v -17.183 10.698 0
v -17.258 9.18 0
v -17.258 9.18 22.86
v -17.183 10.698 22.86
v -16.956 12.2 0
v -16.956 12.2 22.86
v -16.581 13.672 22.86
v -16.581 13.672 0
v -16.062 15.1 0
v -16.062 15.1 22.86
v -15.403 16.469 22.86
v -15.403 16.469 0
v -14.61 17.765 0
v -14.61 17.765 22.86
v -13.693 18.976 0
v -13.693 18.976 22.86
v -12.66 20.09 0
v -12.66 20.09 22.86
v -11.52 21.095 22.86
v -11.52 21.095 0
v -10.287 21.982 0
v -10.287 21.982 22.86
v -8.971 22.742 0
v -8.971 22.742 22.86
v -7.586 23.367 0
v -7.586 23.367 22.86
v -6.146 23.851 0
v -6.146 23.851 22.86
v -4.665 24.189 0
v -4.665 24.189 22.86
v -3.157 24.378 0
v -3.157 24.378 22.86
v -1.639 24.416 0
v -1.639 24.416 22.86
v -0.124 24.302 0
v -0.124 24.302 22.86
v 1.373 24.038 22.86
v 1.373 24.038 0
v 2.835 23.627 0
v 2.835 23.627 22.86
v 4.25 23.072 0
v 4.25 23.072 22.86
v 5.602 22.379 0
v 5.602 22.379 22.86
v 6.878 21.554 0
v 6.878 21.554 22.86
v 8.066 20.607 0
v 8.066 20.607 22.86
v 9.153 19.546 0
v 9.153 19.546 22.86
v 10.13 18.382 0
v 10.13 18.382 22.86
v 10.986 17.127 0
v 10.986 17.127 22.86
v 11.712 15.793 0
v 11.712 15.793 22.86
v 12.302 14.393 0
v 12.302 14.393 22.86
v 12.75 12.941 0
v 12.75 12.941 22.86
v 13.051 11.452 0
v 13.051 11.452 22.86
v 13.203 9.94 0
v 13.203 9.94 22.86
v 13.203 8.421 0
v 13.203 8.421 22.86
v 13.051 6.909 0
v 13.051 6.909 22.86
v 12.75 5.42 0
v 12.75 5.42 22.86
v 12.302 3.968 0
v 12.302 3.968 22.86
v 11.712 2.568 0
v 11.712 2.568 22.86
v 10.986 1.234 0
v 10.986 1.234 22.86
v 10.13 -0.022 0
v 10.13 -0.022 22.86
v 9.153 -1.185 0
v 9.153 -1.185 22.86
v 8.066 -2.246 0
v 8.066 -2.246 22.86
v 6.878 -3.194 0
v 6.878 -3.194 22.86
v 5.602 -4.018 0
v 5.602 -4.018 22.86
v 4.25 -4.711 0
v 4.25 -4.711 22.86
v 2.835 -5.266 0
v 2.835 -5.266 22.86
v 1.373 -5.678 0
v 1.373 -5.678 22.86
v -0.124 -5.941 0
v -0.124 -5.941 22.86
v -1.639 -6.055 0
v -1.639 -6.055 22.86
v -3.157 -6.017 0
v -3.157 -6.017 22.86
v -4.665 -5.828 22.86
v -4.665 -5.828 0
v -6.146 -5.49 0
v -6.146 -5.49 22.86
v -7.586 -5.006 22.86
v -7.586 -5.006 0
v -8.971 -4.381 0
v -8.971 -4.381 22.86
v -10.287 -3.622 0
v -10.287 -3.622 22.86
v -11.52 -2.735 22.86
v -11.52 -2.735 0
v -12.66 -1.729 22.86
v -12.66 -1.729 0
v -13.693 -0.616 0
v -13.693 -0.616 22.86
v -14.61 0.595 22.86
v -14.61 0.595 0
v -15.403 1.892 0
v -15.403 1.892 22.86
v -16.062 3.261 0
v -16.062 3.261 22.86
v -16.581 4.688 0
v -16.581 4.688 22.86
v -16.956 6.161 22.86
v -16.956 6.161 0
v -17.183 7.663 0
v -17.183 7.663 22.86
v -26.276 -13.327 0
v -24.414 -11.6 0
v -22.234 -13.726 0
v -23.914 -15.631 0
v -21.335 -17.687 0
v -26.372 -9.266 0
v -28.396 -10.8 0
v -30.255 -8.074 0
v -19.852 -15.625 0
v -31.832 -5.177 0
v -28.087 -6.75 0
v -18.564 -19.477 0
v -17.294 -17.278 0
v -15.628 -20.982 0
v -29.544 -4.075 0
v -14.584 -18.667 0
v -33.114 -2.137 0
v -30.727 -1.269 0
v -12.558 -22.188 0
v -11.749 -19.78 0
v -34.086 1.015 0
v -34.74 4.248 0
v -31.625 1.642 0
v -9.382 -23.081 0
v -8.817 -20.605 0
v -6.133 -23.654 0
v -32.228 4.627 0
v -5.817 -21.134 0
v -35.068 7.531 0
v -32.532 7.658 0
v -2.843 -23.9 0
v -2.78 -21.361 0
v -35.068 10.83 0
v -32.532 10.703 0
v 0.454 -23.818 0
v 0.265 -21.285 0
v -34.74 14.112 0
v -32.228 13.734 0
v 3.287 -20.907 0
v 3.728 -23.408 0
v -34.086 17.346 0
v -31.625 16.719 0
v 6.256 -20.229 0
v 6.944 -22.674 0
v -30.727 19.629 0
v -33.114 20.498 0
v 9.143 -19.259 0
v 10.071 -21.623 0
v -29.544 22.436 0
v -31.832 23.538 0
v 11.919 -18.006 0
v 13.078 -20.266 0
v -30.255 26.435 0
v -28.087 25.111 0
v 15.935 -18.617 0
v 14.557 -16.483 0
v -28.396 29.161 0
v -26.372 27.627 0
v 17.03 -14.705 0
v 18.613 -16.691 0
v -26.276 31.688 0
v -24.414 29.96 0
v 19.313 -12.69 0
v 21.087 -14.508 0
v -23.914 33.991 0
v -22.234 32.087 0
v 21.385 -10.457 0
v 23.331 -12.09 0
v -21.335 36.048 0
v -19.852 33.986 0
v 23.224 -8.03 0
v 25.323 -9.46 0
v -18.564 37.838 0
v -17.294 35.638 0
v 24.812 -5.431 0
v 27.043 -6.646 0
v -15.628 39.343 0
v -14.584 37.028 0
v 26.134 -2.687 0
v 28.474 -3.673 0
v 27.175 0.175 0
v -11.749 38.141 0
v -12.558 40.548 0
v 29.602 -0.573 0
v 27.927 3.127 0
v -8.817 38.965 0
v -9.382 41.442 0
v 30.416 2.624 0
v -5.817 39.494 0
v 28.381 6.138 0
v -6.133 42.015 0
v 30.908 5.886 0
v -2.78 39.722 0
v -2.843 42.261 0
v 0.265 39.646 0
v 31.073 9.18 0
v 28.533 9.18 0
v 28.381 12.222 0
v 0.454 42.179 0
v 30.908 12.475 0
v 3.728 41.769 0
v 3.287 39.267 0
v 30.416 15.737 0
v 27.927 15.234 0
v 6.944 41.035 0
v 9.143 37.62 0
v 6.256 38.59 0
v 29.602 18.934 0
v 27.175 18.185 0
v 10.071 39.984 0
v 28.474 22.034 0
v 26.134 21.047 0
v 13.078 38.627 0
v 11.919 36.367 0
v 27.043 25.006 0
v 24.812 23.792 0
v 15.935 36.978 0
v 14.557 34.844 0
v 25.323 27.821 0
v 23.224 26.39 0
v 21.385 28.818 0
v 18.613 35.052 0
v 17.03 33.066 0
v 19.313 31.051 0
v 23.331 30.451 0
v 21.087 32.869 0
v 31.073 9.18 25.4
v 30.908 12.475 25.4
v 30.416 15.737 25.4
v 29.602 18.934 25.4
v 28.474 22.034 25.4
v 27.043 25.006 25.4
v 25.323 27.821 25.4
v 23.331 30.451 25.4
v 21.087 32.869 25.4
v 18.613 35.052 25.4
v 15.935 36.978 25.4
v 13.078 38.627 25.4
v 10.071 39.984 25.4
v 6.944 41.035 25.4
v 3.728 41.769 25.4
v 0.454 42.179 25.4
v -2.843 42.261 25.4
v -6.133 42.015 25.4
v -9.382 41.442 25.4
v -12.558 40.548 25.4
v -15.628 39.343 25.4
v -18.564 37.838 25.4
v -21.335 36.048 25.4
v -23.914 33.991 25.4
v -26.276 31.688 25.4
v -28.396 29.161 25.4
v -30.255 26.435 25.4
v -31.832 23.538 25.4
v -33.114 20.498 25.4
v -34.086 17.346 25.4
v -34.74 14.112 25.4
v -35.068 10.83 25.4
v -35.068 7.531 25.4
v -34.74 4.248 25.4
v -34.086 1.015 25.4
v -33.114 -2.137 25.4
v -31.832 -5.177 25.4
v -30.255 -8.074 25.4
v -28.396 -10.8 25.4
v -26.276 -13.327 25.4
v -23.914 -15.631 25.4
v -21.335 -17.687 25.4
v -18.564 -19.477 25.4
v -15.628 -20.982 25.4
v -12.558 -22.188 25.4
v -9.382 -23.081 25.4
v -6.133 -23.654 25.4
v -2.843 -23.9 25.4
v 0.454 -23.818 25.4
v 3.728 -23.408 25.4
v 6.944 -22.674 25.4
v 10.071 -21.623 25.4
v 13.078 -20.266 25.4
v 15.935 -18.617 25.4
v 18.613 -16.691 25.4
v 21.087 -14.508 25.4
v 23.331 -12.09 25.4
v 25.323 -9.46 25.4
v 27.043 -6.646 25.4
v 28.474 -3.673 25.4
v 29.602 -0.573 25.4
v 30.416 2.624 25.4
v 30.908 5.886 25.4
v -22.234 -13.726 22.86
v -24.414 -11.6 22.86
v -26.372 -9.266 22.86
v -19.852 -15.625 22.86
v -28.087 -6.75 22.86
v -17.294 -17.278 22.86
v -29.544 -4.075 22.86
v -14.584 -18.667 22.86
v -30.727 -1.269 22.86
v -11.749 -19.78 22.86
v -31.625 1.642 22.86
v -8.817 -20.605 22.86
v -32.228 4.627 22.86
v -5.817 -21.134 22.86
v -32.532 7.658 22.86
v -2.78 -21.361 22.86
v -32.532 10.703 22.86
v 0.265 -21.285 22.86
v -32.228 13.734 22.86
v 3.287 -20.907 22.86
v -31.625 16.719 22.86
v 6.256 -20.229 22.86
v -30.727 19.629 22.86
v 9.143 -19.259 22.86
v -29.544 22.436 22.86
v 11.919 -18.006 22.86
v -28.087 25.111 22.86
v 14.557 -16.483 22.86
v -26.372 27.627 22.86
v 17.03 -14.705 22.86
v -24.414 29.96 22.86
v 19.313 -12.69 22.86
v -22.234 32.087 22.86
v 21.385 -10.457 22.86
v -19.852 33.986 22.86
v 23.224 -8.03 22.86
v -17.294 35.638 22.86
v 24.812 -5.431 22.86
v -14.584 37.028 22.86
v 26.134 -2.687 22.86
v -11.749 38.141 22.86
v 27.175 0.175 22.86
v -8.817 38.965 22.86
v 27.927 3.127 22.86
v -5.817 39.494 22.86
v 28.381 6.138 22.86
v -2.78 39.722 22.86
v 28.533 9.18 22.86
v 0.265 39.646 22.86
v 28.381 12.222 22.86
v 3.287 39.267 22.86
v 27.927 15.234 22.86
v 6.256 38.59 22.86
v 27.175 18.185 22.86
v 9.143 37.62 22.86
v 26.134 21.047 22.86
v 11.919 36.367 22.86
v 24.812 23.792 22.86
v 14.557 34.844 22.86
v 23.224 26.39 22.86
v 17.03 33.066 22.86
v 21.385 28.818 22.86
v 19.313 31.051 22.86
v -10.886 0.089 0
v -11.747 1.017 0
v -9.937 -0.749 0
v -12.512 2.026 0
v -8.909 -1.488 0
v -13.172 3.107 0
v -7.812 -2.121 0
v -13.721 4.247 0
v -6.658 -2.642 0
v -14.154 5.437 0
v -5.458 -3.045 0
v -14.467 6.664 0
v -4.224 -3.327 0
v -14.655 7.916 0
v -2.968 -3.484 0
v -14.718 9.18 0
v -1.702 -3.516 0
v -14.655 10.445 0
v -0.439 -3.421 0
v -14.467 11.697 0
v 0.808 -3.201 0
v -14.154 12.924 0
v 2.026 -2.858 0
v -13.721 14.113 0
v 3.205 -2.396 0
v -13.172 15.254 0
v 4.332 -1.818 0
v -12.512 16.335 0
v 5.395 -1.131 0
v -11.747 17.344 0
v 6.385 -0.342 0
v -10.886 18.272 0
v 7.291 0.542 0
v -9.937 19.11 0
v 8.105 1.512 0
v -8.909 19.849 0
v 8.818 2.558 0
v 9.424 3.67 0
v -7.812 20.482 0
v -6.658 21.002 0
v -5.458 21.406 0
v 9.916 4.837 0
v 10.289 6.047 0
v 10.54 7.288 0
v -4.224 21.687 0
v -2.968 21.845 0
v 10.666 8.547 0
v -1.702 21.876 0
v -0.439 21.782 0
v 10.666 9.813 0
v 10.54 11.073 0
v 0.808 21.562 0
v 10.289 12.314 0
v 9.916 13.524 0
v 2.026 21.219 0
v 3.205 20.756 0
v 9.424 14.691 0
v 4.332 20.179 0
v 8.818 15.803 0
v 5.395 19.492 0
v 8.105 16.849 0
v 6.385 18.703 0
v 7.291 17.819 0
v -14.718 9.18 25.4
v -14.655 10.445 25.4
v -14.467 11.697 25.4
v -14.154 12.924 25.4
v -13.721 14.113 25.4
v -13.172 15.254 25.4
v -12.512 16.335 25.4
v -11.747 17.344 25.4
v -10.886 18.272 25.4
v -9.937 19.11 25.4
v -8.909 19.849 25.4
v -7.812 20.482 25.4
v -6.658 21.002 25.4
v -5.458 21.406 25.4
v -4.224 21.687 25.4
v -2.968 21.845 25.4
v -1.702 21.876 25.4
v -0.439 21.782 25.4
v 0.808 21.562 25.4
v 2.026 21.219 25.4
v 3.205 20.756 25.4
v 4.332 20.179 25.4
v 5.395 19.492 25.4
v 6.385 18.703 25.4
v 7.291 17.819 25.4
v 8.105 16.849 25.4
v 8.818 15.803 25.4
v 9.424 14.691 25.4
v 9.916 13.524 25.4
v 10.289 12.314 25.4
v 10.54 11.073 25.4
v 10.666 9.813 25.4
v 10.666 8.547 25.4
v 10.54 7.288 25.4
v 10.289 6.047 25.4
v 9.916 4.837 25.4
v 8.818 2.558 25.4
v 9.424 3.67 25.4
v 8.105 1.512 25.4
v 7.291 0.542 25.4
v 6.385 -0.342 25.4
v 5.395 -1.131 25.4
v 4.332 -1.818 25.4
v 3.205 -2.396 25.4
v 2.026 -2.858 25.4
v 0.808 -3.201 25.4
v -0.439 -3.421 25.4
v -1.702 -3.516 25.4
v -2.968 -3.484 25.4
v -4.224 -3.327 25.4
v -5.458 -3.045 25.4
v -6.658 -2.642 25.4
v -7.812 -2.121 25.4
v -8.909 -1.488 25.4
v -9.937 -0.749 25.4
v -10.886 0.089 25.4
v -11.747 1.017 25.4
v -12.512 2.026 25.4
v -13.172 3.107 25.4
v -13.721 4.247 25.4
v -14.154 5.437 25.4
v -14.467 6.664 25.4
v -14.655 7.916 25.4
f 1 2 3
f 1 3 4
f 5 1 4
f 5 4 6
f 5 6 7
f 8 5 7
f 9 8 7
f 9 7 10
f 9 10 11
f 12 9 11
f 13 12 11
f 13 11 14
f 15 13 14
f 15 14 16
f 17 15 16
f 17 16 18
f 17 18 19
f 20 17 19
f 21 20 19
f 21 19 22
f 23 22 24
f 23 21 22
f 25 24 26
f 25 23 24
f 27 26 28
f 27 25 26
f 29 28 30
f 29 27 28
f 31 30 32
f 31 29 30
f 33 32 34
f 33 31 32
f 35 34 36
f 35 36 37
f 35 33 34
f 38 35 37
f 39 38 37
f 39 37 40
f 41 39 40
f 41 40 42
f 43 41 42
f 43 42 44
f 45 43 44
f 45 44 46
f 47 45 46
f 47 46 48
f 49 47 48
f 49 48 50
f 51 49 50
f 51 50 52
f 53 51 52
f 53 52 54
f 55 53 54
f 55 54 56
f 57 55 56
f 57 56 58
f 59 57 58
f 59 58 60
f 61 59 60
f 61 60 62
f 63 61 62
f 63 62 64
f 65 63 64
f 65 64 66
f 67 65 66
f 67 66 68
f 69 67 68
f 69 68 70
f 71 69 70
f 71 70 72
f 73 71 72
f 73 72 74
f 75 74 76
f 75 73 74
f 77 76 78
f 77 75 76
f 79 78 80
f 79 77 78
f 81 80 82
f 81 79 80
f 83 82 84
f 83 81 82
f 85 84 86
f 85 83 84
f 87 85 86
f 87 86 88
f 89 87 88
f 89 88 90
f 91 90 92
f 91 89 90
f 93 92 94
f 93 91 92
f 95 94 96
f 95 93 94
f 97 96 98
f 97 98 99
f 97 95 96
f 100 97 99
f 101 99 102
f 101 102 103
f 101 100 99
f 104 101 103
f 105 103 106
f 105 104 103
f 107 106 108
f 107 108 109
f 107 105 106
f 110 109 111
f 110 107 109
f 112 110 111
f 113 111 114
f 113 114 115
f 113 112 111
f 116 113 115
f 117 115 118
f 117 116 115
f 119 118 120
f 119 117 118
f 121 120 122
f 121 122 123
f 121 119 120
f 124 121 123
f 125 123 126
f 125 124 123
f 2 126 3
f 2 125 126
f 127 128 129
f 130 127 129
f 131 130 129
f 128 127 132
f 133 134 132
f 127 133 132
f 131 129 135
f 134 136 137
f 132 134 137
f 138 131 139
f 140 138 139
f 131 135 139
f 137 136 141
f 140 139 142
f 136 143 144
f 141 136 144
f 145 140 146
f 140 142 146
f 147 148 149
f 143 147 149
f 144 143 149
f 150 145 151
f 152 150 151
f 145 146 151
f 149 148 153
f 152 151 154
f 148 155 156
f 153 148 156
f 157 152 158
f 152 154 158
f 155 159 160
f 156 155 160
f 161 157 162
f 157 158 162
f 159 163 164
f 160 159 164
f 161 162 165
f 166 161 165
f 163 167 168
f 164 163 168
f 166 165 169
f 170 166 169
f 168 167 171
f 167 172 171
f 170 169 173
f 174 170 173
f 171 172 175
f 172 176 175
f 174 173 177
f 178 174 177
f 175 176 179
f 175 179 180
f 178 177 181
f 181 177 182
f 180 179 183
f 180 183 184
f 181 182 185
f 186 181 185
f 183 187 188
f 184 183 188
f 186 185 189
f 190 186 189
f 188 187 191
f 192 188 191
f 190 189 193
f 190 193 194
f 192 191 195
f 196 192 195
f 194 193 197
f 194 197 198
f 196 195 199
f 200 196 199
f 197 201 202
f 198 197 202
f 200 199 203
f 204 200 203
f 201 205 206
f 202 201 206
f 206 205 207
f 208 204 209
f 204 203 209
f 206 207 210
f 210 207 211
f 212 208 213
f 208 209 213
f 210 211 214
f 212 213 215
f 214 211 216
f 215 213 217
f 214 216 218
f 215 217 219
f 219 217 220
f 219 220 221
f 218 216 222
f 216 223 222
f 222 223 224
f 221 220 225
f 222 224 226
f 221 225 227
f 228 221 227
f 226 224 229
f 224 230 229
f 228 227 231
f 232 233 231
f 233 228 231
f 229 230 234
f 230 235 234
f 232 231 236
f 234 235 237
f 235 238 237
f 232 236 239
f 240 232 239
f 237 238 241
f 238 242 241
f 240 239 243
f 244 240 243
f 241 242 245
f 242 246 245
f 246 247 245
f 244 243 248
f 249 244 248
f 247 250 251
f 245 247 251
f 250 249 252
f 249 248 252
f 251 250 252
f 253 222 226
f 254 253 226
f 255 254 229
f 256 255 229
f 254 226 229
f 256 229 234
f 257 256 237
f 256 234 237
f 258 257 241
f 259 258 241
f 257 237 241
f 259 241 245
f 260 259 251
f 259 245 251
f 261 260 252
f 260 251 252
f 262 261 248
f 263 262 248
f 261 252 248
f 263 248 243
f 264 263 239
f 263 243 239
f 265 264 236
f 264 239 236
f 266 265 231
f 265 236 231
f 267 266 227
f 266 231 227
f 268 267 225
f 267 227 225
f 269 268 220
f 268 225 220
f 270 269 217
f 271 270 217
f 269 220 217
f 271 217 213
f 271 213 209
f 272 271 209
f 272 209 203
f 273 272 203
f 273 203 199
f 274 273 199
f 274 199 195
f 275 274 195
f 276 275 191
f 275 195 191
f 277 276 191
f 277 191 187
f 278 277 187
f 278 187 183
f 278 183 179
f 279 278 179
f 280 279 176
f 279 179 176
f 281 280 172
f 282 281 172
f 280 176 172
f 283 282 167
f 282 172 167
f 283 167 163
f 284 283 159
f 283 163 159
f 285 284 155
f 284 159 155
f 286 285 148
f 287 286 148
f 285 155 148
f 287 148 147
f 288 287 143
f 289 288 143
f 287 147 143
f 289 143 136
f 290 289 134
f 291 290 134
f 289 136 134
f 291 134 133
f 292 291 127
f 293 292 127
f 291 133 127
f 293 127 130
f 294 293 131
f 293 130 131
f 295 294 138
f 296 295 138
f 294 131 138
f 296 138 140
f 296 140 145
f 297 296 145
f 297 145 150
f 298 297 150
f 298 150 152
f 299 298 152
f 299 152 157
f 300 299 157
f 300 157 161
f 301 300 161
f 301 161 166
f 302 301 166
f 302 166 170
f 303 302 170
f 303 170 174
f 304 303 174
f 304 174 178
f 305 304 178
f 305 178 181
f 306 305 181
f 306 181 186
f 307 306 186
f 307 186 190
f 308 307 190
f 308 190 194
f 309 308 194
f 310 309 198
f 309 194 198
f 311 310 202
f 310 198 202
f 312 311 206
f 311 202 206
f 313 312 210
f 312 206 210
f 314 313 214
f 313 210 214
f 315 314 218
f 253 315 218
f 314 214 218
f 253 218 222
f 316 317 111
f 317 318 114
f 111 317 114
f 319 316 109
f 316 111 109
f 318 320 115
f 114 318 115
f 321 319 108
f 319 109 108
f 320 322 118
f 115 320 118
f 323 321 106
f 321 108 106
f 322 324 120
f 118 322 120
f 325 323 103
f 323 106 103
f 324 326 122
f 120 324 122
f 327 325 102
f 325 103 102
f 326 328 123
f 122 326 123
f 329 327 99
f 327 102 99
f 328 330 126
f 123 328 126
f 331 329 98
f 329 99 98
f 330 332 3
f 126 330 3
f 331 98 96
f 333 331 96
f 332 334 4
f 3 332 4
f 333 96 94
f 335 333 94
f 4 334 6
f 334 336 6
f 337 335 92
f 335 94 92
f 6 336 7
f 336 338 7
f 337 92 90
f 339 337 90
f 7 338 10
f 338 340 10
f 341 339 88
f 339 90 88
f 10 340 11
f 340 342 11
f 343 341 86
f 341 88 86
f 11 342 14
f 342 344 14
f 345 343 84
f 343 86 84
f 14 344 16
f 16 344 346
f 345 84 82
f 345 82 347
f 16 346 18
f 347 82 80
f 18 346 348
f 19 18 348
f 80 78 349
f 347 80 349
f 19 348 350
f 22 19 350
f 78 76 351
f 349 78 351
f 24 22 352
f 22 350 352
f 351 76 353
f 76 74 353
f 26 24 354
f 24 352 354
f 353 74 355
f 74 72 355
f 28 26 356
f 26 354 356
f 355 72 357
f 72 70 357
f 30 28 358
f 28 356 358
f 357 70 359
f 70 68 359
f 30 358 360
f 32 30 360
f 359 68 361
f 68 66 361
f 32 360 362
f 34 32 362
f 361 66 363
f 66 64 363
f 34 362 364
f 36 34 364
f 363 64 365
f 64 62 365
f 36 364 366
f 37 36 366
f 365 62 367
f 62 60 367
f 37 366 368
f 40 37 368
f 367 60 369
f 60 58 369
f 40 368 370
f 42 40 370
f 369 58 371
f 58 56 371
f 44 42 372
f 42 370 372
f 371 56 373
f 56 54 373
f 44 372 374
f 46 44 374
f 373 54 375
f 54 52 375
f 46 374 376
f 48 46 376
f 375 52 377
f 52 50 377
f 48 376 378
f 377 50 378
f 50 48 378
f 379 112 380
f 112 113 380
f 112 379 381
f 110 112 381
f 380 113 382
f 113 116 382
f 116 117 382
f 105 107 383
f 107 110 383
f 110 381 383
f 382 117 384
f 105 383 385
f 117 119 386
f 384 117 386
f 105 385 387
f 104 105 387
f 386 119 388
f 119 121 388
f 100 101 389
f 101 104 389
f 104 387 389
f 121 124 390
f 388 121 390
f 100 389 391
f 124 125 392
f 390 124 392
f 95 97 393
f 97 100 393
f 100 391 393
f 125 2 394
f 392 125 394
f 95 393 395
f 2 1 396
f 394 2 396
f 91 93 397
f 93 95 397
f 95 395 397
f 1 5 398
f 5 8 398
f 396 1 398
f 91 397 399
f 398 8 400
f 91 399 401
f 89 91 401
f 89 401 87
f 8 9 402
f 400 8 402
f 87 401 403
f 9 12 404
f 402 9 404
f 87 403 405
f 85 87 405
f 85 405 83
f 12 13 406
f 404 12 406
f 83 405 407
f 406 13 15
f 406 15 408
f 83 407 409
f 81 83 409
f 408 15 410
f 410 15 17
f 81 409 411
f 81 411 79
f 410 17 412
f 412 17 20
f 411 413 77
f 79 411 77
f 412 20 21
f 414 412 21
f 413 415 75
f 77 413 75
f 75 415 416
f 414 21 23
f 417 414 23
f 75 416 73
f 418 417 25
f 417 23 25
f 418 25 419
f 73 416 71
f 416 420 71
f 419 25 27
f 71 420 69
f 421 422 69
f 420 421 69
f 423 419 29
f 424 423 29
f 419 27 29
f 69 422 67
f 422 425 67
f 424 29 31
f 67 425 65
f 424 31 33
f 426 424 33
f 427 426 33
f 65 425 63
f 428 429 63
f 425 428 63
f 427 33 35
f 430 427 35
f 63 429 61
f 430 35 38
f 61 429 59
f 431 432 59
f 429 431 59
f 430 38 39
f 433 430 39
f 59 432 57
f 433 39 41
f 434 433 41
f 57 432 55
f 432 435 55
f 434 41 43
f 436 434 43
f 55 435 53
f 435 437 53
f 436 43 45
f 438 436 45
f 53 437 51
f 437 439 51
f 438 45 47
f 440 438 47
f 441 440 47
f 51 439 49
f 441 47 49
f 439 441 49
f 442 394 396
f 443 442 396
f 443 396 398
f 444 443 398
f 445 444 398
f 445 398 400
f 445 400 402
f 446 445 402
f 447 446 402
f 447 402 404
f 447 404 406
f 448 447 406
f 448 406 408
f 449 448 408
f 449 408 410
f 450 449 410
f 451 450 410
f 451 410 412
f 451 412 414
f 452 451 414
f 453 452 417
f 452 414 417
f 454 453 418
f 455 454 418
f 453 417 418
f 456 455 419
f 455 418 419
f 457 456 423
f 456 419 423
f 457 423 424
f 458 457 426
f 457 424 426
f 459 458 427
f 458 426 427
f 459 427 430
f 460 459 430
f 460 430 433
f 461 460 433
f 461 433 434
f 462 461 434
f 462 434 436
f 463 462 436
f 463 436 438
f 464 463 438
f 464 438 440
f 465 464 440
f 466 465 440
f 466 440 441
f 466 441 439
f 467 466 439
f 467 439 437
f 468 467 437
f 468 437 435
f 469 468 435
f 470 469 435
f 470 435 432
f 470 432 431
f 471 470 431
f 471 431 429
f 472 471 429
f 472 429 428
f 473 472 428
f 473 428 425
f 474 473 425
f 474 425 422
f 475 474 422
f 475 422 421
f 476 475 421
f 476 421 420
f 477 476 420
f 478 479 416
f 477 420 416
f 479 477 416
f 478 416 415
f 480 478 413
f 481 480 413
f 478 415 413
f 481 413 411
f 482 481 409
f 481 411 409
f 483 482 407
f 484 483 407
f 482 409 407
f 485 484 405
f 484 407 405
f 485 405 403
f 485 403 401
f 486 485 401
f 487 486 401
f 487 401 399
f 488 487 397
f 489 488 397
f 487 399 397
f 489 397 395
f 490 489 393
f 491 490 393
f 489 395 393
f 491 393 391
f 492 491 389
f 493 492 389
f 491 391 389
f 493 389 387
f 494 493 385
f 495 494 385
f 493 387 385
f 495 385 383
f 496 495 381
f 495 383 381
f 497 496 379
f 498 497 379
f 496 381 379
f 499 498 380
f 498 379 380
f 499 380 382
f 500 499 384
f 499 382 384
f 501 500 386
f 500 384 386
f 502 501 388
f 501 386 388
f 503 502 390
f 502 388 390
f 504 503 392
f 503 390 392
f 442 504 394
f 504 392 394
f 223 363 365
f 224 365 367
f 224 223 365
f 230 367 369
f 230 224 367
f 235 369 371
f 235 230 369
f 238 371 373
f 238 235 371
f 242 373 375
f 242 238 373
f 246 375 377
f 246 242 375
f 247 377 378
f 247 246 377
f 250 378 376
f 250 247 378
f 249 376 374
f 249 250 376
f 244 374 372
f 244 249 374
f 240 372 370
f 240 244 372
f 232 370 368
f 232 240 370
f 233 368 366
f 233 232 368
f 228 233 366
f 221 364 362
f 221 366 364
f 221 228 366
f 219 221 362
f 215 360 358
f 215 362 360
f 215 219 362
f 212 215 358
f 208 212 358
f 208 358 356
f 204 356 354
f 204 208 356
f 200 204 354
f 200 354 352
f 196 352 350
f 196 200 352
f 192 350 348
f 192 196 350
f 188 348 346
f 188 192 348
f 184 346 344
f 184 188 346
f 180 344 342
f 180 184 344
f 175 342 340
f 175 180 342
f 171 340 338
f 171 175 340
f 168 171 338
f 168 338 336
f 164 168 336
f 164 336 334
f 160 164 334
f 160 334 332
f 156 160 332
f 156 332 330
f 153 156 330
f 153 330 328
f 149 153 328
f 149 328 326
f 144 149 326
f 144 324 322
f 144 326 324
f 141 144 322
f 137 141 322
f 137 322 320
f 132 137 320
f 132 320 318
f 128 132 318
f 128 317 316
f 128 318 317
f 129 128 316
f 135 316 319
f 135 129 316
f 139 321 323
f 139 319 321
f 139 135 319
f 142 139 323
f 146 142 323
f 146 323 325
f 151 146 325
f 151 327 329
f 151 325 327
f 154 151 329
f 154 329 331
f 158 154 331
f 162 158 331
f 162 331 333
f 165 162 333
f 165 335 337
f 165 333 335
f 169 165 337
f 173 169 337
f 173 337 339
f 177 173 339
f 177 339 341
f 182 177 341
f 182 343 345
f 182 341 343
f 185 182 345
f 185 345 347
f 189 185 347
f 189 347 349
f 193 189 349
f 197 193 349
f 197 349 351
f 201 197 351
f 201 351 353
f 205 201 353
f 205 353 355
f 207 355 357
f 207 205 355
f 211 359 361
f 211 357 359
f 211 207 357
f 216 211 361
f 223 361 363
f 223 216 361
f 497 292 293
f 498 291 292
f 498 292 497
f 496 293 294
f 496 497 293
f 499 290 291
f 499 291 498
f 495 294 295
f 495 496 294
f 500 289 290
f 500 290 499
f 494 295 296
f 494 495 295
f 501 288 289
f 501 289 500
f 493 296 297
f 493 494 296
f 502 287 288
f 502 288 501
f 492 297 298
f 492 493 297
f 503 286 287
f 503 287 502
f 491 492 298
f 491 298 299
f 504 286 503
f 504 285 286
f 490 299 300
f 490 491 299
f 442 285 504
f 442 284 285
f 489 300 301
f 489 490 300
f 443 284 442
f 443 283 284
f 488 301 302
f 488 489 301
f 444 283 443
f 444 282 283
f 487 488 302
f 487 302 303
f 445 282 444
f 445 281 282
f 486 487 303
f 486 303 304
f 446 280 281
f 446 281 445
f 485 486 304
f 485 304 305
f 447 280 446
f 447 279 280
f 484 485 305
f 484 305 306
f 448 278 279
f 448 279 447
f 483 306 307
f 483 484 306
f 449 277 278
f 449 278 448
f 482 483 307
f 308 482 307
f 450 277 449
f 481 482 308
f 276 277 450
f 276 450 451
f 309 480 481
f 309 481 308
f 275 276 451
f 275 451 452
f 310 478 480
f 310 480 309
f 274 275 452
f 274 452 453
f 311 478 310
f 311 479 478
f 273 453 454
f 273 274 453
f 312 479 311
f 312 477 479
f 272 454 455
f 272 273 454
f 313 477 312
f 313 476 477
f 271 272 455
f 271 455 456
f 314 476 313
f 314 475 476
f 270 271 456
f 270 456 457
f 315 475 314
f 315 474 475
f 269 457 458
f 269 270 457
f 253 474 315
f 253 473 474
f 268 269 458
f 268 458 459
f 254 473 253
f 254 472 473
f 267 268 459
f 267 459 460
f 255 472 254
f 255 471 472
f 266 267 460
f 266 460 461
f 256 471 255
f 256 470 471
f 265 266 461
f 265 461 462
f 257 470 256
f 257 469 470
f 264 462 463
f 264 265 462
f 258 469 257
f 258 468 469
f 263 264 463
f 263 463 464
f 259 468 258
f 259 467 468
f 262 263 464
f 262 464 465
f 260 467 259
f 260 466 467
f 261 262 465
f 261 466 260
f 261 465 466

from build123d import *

# Parameters (mm, degrees)
F0_R     = 33.0910363523
F1_DEPTH = 25.4
F3_D     = 25.4
F4_T     = -2.54


with BuildPart() as f1:
    # F0 (on Top) → F1 (new body)
    with BuildSketch(Plane.XY):
        with Locations((-2.0184996538, 9.1803725809)):
            Circle(F0_R)
    extrude(amount=F1_DEPTH)

    # F3 (through all)
    with Locations(Plane.XY.offset(25.4)):
        with Locations((-2.0184996538, 9.1803725809)):
            Hole(F3_D / 2)

    # F4
    f4_openings = [f1.faces().sort_by_distance(p)[0] for p in [
        (-34.17358, 9.180373, 0),
    ]]
    offset(amount=F4_T, openings=f4_openings)


solid = f1.part
